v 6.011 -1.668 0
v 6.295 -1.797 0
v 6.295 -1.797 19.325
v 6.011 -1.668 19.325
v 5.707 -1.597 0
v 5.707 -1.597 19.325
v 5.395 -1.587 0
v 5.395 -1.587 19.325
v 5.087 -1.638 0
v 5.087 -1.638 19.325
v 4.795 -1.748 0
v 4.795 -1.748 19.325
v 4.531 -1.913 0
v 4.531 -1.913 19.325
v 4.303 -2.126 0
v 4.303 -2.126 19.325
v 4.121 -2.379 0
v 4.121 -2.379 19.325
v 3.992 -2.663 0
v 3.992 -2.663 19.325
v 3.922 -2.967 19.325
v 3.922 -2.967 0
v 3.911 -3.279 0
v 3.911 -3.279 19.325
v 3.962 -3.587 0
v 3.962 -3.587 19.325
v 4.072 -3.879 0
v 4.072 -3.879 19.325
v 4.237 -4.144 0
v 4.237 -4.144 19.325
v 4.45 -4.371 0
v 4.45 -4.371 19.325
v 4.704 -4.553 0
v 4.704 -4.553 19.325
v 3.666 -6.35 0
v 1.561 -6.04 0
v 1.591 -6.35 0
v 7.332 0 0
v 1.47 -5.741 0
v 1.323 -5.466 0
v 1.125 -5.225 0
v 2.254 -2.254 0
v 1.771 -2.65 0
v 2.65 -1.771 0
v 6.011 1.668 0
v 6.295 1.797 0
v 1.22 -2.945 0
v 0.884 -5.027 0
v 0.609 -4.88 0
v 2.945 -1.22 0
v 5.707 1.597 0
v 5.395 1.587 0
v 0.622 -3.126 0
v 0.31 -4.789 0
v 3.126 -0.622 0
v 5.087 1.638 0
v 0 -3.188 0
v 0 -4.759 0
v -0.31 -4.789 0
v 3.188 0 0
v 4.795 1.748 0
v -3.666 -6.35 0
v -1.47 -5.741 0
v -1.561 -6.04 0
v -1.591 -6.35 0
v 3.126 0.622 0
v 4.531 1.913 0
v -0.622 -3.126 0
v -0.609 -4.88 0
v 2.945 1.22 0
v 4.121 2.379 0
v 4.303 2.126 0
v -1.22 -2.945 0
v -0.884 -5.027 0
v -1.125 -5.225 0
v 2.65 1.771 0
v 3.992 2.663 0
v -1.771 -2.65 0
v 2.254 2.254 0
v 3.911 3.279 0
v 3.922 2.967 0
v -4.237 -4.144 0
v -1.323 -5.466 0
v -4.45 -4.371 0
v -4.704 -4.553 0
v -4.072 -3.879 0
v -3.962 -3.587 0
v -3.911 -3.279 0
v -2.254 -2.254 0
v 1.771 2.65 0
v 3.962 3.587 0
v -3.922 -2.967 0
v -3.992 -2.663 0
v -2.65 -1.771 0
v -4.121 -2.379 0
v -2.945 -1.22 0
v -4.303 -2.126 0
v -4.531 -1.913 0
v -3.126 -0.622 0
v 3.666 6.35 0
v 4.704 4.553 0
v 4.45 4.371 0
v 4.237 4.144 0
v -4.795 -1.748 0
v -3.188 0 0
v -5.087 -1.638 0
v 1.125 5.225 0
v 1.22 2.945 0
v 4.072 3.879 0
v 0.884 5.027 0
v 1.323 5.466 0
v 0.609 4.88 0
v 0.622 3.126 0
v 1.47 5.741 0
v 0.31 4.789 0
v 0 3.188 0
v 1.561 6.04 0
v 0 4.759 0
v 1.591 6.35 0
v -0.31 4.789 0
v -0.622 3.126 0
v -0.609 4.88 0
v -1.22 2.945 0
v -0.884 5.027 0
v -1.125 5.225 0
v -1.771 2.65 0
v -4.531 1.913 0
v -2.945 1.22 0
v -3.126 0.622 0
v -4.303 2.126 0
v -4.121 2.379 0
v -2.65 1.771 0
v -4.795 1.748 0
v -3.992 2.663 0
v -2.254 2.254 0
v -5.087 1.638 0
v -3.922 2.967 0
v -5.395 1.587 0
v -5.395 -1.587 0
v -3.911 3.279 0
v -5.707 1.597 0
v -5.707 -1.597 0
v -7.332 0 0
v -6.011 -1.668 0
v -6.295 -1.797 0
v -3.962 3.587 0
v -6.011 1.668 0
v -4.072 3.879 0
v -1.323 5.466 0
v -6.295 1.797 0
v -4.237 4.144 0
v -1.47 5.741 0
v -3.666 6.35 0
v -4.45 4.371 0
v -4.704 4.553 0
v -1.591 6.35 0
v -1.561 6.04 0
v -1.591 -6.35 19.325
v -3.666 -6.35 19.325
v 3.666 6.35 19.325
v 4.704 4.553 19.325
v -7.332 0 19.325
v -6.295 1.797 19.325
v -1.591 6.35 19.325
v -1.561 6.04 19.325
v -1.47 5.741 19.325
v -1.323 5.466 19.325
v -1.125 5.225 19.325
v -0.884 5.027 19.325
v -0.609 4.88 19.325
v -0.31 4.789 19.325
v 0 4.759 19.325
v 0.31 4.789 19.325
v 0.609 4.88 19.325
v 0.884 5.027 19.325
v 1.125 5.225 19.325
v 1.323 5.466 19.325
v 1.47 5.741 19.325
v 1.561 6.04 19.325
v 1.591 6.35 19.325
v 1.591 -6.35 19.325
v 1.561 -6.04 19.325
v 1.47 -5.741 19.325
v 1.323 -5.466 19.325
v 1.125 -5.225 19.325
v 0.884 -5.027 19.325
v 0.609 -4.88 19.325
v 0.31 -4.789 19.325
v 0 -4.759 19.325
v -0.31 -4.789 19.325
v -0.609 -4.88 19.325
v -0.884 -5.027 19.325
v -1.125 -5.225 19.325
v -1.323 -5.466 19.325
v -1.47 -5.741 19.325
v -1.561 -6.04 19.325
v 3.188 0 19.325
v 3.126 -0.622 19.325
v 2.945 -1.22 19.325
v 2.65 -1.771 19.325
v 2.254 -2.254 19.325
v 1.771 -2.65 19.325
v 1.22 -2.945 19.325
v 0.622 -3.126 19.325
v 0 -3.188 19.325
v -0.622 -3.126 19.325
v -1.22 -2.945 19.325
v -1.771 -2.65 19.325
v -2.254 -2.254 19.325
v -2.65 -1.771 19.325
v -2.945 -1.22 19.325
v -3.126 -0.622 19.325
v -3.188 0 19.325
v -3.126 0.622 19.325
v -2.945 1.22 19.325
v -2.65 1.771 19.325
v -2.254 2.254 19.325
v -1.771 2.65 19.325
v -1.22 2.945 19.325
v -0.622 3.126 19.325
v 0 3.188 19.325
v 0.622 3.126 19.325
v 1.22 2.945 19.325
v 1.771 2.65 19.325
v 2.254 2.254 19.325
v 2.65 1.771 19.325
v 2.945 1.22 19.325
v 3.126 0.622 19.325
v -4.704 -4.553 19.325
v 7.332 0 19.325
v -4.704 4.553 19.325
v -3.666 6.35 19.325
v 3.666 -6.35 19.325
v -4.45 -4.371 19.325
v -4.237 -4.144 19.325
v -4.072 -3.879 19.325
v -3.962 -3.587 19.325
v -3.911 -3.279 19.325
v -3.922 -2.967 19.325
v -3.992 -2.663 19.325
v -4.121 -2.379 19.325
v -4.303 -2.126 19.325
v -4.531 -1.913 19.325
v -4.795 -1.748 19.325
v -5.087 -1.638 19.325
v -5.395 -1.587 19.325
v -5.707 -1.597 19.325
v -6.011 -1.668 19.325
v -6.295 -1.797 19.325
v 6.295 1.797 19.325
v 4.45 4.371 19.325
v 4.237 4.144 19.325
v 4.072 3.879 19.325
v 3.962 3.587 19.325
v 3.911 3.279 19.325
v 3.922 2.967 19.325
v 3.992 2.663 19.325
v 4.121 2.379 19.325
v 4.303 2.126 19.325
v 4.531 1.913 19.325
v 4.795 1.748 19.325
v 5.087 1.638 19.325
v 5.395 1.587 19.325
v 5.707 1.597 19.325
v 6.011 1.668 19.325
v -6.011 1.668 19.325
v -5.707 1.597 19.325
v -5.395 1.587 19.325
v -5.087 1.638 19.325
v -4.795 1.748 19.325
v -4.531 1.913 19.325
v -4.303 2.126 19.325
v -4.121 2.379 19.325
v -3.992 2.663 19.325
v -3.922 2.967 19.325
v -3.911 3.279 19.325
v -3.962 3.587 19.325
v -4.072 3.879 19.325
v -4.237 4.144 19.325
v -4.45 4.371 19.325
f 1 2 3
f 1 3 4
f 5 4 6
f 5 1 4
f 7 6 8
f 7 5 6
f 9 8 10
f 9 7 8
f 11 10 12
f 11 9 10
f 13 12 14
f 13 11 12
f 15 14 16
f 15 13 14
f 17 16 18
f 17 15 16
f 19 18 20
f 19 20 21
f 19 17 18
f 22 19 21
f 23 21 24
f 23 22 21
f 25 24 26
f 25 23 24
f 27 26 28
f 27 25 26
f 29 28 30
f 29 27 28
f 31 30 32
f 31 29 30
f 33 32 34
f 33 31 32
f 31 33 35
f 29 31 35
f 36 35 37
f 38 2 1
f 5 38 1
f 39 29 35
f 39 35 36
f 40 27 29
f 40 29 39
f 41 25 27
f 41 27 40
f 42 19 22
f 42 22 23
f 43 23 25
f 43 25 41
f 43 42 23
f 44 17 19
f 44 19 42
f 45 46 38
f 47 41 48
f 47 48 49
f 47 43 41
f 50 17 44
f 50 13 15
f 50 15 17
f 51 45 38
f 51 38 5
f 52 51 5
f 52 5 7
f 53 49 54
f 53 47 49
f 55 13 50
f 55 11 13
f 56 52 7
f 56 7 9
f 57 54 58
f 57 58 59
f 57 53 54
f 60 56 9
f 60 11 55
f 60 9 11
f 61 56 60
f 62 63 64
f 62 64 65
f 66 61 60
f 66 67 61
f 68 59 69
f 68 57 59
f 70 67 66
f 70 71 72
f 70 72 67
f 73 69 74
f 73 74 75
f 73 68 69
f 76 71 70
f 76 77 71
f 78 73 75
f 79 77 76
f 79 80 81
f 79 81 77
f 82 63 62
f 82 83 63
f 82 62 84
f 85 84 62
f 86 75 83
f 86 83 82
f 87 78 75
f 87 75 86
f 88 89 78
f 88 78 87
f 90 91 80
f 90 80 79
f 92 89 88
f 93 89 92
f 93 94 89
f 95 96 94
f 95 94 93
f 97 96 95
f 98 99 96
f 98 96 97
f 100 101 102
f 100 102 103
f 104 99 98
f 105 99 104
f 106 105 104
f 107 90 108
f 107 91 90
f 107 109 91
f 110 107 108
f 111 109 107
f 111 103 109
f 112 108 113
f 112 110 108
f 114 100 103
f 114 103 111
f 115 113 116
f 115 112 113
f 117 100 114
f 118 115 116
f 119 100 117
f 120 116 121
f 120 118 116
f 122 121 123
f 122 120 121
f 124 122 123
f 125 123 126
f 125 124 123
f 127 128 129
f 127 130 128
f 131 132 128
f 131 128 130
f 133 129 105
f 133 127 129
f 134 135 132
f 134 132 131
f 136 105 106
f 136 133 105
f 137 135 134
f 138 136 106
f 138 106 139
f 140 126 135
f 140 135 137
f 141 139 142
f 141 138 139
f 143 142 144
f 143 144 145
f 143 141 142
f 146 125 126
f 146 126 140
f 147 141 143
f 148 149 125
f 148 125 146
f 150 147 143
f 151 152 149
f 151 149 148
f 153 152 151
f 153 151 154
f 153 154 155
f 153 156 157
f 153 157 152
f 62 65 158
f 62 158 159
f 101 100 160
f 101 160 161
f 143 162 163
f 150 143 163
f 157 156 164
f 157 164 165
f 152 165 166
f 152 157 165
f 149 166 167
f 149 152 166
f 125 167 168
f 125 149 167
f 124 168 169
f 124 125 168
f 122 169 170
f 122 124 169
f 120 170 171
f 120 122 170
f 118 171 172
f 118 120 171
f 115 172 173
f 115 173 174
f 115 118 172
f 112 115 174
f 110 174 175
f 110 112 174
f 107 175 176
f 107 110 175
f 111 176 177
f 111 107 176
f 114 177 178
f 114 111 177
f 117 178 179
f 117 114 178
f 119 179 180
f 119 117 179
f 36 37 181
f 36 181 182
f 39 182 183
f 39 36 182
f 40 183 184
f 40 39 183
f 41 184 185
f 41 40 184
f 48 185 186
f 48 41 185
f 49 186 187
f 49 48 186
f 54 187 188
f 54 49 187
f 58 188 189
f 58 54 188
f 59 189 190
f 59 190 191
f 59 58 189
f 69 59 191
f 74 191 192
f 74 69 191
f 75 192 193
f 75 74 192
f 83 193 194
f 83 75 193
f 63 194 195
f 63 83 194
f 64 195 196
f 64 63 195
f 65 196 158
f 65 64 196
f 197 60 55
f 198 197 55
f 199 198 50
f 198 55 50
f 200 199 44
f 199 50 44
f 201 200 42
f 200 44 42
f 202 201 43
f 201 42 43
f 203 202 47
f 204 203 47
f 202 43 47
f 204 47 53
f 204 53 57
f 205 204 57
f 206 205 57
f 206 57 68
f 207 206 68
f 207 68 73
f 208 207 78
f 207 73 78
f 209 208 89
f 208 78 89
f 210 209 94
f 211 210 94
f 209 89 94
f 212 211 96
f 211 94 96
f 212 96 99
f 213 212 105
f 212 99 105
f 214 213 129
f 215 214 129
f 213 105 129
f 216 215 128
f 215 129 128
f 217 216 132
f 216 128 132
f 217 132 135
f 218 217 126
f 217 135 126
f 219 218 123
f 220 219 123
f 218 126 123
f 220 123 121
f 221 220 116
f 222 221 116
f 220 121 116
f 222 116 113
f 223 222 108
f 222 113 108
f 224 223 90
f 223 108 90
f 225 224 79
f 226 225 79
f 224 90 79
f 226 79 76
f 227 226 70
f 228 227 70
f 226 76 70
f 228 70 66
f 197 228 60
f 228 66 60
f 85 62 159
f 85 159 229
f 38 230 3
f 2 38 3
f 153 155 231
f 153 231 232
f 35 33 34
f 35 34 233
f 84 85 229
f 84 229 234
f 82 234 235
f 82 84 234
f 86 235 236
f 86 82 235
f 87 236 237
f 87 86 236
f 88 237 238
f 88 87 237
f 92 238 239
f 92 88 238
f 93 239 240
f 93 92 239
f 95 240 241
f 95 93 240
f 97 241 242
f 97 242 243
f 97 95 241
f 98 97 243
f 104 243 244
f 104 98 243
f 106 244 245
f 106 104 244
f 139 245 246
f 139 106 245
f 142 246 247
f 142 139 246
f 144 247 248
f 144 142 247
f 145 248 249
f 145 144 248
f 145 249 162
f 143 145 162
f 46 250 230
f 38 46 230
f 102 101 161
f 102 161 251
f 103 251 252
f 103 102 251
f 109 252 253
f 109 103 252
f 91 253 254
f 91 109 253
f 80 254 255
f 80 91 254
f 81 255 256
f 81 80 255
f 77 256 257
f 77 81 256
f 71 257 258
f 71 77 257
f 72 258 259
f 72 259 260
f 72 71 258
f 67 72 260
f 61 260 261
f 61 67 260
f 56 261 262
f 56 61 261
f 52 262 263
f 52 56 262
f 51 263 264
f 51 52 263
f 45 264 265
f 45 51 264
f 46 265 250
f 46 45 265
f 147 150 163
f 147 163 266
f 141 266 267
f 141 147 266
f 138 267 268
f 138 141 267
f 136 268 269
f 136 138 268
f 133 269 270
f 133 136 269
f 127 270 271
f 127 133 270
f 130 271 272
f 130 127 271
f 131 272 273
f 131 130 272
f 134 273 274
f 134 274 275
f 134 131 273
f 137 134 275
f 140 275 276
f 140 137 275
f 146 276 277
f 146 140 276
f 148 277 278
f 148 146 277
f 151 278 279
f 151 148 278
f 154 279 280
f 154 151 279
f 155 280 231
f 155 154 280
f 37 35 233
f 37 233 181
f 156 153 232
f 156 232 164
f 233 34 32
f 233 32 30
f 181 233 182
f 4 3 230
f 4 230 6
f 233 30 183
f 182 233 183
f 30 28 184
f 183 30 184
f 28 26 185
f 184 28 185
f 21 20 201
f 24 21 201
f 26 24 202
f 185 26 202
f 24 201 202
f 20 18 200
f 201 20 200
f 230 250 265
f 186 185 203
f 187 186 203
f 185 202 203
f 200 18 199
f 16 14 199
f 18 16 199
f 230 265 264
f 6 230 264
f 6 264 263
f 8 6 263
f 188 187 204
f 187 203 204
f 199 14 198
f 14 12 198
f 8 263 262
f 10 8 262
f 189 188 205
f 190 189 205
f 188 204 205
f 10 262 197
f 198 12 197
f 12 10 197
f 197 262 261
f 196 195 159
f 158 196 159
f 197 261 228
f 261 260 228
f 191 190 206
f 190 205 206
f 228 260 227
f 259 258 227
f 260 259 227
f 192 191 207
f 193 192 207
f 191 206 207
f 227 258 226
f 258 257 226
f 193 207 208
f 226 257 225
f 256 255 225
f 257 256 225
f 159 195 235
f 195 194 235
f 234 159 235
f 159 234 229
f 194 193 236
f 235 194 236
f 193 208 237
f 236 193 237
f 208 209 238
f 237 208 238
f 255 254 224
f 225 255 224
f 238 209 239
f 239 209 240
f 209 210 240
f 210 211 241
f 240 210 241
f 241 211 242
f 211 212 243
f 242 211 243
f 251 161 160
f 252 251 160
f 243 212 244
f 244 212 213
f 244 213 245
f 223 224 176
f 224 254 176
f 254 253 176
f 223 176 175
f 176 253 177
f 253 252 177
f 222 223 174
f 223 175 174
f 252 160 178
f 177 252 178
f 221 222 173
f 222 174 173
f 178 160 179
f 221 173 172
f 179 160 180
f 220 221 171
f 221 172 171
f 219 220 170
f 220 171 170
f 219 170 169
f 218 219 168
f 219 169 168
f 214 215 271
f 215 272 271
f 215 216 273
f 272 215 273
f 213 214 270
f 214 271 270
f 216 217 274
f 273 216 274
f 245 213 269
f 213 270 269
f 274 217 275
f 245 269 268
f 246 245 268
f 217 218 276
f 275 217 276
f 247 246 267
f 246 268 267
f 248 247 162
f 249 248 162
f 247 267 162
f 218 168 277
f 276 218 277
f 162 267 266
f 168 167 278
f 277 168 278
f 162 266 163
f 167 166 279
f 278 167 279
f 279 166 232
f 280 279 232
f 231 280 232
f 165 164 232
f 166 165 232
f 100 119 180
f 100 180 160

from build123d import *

# Parameters (mm, degrees)
SKETCH1_R           = 2.9337
BOSS_EXTRUDE1_DEPTH = 19.325
MOVE_FACE1_BY       = 0.254


with BuildPart() as part:
    # Sketch1 → Boss-Extrude1 (new body)
    with BuildSketch(Plane(origin=(0, 0, 0), x_dir=(-1, 0, 0), z_dir=(0, 0, -1))):
        with BuildLine():
            Line((-4.703606334, -4.55311485), (-3.666174209, -6.35))
            Line((-3.666174209, -6.35), (-1.591309959, -6.35))
            ThreePointArc((-1.591309959, -6.35), (0, -4.758690041), (1.591309959, -6.35))
            Line((1.591309959, -6.35), (3.666174209, -6.35))
            Line((3.666174209, -6.35), (4.703606334, -4.55311485))
            ThreePointArc((4.703606334, -4.55311485), (4.121146464, -2.37934502), (6.294916294, -1.79688515))
            Line((6.294916294, -1.79688515), (7.332348419, 0))
            Line((7.332348419, 0), (6.294916294, 1.79688515))
            ThreePointArc((6.294916294, 1.79688515), (4.121146464, 2.37934502), (4.703606334, 4.55311485))
            Line((4.703606334, 4.55311485), (3.666174209, 6.35))
            Line((3.666174209, 6.35), (1.591309959, 6.35))
            ThreePointArc((1.591309959, 6.35), (0, 4.758690041), (-1.591309959, 6.35))
            Line((-1.591309959, 6.35), (-3.666174209, 6.35))
            Line((-3.666174209, 6.35), (-4.703606334, 4.55311485))
            ThreePointArc((-4.703606334, 4.55311485), (-4.121146464, 2.37934502), (-6.294916294, 1.79688515))
            Line((-6.294916294, 1.79688515), (-7.332348419, 0))
            Line((-7.332348419, 0), (-6.294916294, -1.79688515))
            ThreePointArc((-6.294916294, -1.79688515), (-4.121146464, -2.37934502), (-4.703606334, -4.55311485))
        make_face()
        with Locations(Location((0, 0, 0), (0, 0, 180))):
            Circle(SKETCH1_R, mode=Mode.SUBTRACT)
    extrude(amount=-BOSS_EXTRUDE1_DEPTH)

    # Move Face1: a curved face moved inward by 0.254
    add(Solid.thicken(part.faces().sort_by_distance((-2.9337, 0, 9.6625))[0], -MOVE_FACE1_BY), mode=Mode.SUBTRACT)


solid = part.part
